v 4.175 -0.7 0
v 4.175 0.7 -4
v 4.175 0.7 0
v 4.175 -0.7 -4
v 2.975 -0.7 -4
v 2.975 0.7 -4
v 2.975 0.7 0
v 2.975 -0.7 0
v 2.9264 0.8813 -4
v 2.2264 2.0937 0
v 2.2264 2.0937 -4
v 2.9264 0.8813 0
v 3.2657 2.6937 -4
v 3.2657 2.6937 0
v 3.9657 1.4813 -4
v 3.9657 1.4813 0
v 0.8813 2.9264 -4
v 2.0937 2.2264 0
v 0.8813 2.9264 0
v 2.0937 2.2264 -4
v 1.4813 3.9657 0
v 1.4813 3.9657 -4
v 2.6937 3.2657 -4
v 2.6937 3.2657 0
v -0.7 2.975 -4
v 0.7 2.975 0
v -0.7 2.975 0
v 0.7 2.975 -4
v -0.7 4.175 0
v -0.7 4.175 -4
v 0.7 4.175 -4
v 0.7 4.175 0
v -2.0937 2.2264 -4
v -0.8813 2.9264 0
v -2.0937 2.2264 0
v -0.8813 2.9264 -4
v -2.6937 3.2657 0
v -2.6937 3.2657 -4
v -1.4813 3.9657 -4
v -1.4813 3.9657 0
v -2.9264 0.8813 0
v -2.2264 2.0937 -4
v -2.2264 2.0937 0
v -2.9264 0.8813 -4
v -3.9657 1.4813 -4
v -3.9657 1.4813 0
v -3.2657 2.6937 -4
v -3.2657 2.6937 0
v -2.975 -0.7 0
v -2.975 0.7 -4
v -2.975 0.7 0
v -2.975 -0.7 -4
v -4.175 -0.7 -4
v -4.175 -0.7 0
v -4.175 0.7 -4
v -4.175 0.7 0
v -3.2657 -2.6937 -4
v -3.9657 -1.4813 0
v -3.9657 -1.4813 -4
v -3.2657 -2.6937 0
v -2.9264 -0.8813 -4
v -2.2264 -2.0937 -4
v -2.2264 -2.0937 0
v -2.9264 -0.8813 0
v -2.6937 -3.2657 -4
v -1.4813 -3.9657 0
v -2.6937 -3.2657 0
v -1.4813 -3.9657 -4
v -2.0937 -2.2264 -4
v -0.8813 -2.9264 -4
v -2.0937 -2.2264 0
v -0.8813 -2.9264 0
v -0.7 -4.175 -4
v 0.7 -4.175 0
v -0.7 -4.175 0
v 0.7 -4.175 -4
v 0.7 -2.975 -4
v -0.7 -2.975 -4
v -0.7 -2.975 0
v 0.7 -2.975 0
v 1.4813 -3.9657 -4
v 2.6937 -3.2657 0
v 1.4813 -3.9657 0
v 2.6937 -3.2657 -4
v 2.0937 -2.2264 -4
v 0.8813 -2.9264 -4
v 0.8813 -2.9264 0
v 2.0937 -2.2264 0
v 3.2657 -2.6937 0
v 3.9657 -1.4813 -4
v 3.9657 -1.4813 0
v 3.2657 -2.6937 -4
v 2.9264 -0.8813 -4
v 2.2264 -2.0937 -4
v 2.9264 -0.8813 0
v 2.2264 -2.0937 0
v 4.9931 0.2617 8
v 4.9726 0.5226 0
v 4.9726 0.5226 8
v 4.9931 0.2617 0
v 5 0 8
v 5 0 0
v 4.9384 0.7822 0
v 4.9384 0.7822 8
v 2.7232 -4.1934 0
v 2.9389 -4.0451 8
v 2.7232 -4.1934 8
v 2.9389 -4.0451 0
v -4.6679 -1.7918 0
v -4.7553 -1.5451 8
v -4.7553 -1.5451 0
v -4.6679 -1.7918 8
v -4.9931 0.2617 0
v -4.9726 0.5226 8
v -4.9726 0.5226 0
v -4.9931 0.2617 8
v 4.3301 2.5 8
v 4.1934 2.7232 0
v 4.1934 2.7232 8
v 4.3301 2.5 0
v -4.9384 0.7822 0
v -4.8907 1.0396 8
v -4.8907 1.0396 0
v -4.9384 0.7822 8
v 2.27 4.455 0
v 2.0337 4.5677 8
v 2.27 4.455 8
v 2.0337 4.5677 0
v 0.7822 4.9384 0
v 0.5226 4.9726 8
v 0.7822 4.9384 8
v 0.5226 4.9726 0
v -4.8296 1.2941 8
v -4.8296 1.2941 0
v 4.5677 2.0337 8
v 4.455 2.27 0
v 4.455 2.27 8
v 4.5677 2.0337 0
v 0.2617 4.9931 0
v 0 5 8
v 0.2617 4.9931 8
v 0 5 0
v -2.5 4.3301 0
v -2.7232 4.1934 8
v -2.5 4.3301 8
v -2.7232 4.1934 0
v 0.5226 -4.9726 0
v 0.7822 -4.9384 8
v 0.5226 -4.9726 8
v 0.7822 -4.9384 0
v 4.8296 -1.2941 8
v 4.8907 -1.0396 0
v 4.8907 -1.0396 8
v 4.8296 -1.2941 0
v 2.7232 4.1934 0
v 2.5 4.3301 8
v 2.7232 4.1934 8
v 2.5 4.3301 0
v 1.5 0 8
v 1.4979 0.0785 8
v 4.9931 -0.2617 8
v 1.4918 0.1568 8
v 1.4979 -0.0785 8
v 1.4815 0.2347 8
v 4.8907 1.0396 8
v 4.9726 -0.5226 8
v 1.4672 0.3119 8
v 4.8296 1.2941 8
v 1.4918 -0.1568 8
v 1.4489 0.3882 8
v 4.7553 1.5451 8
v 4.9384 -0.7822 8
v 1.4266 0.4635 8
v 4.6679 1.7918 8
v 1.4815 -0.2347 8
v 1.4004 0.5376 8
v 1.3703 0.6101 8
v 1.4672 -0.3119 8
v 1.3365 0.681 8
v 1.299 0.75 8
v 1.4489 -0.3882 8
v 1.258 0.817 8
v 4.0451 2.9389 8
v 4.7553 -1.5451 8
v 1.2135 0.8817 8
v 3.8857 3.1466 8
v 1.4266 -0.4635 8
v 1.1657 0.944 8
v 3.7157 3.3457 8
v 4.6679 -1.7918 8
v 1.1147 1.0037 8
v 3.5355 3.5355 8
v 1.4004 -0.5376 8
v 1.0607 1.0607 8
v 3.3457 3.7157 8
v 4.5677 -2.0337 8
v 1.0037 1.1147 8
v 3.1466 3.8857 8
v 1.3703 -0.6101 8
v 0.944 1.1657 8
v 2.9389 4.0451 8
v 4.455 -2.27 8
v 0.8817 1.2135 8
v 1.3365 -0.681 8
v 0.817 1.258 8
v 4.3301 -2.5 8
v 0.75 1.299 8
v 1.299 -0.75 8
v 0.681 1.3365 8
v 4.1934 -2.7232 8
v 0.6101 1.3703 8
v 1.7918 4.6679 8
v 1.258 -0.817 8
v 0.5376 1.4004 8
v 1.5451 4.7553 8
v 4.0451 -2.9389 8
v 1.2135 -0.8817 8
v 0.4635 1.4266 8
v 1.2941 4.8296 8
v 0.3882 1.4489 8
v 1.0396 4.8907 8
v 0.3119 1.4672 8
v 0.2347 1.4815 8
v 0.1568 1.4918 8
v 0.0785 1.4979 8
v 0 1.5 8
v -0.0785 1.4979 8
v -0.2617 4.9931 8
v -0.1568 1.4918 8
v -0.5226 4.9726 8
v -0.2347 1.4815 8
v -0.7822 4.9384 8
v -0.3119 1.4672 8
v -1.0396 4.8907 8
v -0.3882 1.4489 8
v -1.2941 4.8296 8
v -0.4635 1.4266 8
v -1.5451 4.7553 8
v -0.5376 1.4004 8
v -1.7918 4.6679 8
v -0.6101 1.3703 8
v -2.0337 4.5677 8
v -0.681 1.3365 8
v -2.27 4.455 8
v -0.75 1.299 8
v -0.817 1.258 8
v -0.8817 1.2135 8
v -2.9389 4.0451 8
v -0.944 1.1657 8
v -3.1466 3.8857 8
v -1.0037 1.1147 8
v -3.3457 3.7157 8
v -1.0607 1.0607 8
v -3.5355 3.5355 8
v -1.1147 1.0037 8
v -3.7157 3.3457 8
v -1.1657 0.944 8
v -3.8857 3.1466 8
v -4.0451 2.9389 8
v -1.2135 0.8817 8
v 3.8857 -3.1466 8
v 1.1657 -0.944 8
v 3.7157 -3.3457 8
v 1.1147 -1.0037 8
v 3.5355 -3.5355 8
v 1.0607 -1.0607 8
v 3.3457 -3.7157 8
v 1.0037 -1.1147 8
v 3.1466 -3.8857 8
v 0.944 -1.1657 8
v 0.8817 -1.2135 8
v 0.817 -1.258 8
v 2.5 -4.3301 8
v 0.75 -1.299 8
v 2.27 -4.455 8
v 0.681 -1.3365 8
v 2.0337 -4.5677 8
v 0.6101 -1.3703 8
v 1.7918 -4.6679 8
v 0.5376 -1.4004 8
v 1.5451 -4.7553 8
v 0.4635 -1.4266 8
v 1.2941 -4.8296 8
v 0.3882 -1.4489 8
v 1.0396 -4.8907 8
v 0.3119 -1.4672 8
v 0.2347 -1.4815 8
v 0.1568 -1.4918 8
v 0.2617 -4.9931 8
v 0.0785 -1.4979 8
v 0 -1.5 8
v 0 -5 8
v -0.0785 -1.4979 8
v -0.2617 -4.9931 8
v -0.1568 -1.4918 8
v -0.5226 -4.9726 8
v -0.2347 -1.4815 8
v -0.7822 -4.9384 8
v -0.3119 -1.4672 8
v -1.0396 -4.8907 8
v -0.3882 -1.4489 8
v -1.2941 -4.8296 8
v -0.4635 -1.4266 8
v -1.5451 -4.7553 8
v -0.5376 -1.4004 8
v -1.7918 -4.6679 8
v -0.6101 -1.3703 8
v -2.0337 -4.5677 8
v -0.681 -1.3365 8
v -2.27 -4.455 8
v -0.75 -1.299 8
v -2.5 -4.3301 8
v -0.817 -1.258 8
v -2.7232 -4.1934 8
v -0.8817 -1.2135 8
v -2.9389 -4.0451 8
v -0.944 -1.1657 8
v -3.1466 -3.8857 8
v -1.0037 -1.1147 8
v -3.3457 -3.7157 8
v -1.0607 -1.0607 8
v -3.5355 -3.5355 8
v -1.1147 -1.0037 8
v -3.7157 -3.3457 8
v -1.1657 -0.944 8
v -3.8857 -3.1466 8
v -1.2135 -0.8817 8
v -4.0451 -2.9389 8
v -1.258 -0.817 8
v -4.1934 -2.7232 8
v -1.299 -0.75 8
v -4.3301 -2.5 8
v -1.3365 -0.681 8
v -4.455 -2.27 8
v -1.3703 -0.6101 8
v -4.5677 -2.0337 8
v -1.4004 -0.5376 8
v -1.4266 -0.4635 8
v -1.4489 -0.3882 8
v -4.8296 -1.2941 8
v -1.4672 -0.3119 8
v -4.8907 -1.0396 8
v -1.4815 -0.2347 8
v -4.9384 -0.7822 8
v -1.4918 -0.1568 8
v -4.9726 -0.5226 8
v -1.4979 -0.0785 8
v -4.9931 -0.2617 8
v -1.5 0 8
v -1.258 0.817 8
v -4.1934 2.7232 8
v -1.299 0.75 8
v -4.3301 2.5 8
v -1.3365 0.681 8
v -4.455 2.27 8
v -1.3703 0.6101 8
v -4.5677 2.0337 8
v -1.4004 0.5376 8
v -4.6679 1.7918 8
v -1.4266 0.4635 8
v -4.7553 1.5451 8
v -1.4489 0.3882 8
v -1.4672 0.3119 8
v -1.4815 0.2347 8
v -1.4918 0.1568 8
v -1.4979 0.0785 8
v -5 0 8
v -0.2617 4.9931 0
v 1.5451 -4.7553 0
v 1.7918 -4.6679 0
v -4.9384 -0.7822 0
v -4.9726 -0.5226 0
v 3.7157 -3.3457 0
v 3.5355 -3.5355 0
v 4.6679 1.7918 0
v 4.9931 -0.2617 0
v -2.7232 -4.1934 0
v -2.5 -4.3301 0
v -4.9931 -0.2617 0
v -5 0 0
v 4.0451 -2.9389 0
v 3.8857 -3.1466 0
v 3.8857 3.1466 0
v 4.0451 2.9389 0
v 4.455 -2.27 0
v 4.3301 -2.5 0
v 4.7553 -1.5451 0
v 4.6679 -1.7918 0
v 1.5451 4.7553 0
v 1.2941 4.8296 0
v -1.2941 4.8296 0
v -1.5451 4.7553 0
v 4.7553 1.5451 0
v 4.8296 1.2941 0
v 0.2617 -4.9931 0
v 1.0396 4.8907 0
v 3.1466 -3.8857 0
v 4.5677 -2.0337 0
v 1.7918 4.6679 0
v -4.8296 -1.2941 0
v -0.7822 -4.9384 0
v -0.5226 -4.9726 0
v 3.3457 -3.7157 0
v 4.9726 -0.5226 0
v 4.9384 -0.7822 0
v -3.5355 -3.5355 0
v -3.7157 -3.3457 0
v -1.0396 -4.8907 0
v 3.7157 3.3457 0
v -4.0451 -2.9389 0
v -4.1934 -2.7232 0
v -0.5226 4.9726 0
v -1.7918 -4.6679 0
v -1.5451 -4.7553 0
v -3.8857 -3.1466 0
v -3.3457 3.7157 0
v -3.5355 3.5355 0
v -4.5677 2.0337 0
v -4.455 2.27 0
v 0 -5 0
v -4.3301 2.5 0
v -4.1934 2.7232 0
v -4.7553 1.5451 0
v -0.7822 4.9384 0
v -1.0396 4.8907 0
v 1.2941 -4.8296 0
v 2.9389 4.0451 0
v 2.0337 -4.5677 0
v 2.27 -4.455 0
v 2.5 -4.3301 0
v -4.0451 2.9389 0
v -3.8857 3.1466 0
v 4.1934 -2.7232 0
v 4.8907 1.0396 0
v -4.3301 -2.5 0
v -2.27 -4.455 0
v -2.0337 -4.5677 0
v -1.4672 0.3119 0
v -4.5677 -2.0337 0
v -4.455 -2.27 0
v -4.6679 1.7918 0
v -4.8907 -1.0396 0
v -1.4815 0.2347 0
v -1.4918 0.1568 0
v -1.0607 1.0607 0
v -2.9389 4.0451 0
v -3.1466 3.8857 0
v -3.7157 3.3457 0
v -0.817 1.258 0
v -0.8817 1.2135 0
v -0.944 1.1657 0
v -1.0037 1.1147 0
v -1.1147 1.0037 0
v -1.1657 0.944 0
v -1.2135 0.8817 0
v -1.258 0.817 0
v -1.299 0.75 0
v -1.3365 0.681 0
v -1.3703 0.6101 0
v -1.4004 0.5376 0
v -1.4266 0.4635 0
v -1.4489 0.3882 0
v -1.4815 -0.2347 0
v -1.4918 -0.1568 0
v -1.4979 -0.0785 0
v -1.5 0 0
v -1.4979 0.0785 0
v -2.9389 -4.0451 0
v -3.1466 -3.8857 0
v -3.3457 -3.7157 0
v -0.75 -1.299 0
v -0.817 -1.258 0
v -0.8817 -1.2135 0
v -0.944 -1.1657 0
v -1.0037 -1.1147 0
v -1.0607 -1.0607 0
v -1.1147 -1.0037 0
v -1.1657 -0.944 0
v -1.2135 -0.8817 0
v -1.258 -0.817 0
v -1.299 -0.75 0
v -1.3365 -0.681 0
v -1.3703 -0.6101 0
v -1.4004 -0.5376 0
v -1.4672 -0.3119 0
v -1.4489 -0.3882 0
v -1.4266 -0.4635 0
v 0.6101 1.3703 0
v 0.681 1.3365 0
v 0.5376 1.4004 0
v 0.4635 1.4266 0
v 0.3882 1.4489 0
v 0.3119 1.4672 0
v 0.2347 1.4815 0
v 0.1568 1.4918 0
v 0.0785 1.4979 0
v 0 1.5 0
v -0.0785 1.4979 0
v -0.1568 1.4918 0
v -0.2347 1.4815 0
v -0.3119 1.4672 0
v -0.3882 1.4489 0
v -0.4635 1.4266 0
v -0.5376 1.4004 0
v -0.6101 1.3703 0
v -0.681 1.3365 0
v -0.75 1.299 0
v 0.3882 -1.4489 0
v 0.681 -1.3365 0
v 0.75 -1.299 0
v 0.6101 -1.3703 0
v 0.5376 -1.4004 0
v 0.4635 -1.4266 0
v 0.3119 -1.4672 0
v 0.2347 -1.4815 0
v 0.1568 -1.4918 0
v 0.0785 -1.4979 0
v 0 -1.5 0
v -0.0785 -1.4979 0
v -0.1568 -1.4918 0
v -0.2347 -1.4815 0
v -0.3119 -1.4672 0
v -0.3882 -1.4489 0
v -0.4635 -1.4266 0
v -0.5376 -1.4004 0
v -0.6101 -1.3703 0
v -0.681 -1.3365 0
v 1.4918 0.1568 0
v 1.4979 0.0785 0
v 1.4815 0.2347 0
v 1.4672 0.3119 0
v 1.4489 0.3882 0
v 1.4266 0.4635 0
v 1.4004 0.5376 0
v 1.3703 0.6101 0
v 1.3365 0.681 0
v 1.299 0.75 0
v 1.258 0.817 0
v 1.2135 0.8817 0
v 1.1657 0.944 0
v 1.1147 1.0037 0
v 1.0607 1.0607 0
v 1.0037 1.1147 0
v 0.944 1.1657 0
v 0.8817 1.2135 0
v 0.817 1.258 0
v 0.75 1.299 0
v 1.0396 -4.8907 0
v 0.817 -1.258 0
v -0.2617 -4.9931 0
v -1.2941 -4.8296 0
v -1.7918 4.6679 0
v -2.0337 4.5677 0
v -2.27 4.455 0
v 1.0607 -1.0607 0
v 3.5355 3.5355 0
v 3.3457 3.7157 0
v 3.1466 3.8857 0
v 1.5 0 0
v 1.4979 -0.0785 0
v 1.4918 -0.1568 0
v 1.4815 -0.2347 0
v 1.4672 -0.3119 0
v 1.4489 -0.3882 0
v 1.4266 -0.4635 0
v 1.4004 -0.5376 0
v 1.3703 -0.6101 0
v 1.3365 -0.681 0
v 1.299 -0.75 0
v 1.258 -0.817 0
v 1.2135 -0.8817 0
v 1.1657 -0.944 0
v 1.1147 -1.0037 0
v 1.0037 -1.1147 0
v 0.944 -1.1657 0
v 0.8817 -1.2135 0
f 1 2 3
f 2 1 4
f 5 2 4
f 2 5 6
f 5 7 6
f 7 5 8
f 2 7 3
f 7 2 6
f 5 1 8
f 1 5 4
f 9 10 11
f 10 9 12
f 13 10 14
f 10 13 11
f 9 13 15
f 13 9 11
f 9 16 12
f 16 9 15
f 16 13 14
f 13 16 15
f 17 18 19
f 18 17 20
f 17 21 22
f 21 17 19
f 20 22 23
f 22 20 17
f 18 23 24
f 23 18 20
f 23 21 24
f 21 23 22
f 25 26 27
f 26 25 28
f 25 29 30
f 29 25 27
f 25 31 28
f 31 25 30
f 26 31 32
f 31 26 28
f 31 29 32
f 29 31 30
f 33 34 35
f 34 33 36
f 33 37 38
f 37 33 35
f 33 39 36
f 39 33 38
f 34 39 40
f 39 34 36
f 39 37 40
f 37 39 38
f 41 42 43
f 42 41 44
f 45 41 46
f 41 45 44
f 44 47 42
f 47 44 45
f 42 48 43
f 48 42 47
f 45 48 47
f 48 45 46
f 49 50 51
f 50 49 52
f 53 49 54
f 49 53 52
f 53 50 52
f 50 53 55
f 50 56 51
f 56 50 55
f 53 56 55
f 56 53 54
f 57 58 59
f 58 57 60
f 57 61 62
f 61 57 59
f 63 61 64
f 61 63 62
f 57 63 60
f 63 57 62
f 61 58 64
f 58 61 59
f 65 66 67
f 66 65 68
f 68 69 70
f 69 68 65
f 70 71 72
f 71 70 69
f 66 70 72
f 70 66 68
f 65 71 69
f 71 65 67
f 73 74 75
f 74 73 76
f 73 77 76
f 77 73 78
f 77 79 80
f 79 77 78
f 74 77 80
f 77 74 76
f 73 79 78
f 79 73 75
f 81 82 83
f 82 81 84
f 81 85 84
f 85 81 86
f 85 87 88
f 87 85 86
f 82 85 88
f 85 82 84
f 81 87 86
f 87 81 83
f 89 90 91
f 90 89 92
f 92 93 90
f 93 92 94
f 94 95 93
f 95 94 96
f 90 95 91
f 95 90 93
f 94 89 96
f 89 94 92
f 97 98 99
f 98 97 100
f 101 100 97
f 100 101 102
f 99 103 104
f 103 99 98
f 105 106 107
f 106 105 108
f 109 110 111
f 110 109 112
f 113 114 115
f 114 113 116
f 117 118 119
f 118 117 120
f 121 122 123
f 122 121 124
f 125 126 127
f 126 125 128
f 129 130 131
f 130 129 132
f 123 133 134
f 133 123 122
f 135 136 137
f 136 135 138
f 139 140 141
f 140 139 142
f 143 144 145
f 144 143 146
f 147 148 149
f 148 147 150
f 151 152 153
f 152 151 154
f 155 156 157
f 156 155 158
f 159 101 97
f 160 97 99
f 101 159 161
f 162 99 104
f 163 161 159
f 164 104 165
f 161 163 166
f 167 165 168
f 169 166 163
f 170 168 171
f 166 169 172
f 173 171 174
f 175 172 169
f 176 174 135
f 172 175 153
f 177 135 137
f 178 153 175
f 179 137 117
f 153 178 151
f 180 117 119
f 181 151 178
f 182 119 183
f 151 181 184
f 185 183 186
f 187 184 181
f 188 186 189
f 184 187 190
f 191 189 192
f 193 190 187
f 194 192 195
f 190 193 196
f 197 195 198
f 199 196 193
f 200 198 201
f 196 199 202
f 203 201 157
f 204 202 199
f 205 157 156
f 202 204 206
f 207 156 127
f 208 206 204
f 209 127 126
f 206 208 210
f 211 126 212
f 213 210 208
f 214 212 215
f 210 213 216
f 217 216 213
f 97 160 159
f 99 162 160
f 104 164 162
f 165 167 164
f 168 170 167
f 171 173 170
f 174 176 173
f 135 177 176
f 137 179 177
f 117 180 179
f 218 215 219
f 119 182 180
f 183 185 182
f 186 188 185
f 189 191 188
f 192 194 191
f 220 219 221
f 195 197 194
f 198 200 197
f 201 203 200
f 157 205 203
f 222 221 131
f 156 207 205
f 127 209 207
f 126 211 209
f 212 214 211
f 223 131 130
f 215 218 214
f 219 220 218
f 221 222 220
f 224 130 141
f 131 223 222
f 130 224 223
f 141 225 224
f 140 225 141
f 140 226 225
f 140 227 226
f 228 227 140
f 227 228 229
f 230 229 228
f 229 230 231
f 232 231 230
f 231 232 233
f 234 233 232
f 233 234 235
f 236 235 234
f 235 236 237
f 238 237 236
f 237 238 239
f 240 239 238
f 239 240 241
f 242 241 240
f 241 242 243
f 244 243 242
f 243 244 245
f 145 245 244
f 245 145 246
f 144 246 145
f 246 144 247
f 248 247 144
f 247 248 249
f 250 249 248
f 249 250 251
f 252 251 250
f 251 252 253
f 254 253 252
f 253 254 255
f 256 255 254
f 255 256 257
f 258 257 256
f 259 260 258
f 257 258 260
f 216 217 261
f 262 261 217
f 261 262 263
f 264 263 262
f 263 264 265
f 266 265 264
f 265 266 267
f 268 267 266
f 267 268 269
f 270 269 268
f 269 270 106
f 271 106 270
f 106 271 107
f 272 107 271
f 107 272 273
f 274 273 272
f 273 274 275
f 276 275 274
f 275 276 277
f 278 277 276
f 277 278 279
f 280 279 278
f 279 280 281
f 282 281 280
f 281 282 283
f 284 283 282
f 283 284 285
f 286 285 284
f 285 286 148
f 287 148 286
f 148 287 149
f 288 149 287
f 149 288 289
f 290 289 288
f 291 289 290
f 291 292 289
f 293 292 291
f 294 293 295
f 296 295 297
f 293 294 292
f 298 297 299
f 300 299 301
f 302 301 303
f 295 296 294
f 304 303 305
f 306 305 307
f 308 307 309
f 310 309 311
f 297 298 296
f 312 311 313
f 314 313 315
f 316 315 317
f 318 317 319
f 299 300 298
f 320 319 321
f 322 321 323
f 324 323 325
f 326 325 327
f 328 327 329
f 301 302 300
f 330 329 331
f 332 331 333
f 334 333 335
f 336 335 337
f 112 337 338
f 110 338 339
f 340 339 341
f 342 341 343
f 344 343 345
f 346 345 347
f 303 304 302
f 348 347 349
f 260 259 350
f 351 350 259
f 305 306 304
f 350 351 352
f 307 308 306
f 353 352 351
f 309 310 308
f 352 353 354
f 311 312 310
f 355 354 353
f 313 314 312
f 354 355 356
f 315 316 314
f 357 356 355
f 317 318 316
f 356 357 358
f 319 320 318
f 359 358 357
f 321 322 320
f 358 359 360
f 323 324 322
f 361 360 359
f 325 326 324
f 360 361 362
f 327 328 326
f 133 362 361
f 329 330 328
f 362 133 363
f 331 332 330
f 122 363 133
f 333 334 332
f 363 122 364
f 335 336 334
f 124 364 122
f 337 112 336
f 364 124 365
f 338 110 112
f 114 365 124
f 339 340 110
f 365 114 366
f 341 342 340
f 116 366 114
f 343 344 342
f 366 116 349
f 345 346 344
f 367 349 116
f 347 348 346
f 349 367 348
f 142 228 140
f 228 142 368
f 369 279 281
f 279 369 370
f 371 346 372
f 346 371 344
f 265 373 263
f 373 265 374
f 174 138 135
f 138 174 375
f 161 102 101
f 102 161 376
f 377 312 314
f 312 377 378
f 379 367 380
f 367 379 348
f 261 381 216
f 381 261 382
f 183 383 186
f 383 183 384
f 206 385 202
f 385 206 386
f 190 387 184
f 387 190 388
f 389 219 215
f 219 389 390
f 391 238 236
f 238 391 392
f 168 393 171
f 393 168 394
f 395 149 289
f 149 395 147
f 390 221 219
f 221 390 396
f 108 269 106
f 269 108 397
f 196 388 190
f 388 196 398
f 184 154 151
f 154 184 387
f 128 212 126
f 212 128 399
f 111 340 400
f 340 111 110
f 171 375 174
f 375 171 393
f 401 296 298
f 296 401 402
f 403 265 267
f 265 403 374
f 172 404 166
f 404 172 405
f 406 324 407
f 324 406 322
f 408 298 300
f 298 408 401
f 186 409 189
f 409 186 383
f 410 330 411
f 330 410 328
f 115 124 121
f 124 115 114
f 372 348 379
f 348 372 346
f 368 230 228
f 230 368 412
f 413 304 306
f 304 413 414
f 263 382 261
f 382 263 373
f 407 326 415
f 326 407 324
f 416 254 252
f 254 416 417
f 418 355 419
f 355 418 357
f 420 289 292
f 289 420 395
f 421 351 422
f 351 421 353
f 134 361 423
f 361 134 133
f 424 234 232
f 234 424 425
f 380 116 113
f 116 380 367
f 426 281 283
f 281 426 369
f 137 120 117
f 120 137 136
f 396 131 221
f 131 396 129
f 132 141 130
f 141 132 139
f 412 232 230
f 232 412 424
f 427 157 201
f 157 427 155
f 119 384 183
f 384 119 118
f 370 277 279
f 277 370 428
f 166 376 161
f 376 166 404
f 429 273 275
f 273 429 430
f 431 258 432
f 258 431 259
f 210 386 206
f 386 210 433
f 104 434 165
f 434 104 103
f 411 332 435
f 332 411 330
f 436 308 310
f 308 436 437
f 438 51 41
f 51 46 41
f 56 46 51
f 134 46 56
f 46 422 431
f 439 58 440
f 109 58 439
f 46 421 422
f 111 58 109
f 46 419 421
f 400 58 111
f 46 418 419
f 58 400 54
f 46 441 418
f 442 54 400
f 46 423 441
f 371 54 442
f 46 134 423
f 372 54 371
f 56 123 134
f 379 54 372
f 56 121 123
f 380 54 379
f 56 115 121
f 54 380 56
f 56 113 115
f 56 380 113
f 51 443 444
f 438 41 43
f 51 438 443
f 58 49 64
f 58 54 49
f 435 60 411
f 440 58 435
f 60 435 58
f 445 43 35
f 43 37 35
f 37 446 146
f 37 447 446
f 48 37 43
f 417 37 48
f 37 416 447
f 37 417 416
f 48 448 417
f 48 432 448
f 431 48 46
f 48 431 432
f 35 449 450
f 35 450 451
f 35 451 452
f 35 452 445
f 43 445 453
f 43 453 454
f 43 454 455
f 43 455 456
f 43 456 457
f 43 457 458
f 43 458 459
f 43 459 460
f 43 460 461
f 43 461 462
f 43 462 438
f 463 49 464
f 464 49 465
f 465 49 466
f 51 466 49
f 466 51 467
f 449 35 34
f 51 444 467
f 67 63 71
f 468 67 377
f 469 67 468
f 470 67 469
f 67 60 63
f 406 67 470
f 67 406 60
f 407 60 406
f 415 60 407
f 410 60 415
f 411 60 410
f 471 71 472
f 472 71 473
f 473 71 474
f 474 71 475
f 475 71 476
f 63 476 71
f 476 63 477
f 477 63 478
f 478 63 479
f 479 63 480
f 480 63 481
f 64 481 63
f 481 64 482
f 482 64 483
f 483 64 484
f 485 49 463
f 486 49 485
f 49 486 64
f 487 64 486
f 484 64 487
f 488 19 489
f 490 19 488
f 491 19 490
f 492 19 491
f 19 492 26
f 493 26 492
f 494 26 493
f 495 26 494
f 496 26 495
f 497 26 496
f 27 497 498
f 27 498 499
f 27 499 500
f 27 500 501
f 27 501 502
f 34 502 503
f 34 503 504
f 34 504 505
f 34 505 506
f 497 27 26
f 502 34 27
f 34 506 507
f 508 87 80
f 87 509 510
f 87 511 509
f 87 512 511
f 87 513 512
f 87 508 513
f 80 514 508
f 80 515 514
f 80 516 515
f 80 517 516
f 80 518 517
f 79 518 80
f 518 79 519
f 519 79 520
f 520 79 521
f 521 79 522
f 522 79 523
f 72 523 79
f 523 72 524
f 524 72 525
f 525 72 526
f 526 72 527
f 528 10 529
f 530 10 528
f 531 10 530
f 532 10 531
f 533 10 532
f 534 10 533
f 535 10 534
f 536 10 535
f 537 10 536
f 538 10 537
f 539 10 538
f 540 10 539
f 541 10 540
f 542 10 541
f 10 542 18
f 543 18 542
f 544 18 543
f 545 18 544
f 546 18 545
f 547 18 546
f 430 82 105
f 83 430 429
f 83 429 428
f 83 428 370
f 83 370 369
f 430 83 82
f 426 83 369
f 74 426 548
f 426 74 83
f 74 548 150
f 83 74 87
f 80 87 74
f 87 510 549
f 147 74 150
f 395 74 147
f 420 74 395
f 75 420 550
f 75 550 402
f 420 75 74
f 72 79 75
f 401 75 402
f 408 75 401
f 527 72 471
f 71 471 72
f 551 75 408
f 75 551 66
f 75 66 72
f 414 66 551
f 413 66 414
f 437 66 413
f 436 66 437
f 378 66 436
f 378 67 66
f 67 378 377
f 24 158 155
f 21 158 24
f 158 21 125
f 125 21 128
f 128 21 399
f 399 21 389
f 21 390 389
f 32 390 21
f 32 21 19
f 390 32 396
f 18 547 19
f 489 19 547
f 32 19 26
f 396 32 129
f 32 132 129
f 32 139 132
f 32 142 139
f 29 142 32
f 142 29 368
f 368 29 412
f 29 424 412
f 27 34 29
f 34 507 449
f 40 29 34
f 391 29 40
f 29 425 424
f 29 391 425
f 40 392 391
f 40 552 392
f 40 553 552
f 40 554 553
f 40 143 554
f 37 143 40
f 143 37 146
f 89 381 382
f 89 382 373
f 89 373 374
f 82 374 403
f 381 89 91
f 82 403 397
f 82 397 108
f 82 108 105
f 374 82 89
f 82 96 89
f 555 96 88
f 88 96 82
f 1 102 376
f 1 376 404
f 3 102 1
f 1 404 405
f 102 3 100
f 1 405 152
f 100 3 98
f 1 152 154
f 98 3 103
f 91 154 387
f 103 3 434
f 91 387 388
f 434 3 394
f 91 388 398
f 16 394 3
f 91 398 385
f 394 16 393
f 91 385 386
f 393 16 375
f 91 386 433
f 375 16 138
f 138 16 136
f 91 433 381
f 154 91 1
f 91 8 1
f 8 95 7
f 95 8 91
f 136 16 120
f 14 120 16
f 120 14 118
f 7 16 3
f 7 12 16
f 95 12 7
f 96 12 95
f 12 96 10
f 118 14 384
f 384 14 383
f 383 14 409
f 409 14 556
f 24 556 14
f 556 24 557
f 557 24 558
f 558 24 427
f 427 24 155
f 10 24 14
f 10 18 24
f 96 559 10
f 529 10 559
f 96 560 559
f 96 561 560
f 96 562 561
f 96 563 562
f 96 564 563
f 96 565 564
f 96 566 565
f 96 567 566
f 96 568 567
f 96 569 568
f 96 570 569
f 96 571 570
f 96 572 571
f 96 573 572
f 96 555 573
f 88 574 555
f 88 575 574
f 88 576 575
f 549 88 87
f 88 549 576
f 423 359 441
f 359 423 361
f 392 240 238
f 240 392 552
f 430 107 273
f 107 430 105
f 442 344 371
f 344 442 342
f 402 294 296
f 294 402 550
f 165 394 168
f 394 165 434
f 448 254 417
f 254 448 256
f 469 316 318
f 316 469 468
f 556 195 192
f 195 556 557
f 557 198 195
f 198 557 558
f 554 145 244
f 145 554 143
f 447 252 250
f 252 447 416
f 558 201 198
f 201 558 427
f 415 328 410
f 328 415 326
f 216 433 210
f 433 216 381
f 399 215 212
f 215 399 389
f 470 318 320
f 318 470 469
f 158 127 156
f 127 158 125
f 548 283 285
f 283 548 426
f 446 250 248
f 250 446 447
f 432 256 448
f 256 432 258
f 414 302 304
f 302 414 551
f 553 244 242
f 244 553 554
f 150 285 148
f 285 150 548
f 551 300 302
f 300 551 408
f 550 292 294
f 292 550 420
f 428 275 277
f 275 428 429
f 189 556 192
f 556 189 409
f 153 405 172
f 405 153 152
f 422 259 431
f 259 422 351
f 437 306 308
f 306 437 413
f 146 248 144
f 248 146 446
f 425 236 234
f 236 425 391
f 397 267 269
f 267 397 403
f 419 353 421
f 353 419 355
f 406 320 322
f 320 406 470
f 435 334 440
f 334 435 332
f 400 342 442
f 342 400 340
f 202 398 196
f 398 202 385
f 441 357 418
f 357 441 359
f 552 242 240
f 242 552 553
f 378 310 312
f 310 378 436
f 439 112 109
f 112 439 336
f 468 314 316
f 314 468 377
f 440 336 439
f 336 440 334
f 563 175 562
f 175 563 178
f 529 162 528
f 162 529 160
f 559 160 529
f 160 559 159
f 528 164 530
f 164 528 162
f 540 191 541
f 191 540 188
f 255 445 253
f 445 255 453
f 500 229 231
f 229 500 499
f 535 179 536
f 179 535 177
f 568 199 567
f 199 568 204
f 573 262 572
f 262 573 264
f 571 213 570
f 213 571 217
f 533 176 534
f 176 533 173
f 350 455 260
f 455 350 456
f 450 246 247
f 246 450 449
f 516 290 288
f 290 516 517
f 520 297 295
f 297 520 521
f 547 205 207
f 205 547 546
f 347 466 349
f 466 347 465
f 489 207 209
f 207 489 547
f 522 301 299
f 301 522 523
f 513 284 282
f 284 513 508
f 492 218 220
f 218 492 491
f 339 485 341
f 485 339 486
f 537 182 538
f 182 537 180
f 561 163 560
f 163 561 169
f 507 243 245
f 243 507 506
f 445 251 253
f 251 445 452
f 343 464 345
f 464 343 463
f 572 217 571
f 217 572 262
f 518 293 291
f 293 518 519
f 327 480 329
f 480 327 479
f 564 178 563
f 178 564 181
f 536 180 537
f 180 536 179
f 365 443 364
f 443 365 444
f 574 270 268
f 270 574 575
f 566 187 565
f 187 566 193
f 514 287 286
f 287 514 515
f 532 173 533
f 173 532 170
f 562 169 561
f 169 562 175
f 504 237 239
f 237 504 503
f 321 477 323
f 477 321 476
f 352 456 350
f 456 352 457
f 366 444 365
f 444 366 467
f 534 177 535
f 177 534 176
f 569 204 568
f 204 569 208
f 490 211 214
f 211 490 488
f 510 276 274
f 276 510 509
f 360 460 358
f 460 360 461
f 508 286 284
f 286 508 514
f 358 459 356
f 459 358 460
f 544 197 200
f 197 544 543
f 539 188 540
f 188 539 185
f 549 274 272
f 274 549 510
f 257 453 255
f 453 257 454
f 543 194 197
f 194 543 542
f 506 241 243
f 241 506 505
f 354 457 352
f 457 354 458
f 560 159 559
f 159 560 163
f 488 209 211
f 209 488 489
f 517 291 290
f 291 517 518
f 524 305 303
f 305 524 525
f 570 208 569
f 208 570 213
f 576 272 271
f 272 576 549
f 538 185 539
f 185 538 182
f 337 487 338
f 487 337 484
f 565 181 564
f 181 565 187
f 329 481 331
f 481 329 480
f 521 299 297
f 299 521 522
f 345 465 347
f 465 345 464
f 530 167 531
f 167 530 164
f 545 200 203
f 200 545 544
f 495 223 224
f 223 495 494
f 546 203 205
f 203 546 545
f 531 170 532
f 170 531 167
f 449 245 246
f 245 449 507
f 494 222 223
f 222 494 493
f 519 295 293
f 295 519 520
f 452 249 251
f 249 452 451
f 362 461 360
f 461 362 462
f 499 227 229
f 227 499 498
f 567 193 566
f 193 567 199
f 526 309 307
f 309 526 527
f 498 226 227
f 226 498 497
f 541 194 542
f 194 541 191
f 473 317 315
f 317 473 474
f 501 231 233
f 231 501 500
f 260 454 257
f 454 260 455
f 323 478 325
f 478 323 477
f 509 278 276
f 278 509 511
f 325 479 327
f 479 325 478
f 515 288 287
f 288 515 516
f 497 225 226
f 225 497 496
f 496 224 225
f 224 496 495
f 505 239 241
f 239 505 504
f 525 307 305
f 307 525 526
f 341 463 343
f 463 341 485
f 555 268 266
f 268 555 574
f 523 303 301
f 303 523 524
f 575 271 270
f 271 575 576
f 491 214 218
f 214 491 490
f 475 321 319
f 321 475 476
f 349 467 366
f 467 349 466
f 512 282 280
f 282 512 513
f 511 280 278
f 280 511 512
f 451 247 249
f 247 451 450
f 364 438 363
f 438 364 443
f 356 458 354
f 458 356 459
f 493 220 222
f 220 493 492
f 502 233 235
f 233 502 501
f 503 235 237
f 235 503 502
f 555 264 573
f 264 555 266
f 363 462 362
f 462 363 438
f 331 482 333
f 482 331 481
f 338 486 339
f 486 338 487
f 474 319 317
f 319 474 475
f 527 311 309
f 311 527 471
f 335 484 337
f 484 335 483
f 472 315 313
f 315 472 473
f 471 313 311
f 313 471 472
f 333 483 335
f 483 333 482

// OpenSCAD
$fn = 120;

// Timing pulley (simplified) with 12 teeth and 7.15mm pitch diameter.
// This is a geometric approximation: teeth are modeled as radial rectangular lugs.

teeth = 12;
pitch_d = 7.15;          // mm
pitch_r = pitch_d/2;

pulley_height = 8;       // mm
hub_d = 10;              // mm (body diameter, includes tooth root)
bore_d = 3;              // mm (shaft hole)

tooth_radial = 1.2;      // mm (tooth height above hub OD/2)
tooth_tangential = 1.4;  // mm (tooth width along circumference at pitch radius)

module pulley() {
    difference() {
        union() {
            // Main body
            cylinder(h=pulley_height, d=hub_d);

            // Teeth
            for (i = [0:teeth-1]) {
                rotate([0,0, i*360/teeth])
                    translate([pitch_r, 0, 0])
                        cube([tooth_radial, tooth_tangential, pulley_height], center=true);
            }
        }

        // Bore
        translate([0,0,-0.5])
            cylinder(h=pulley_height+1, d=bore_d);
    }
}

pulley();
